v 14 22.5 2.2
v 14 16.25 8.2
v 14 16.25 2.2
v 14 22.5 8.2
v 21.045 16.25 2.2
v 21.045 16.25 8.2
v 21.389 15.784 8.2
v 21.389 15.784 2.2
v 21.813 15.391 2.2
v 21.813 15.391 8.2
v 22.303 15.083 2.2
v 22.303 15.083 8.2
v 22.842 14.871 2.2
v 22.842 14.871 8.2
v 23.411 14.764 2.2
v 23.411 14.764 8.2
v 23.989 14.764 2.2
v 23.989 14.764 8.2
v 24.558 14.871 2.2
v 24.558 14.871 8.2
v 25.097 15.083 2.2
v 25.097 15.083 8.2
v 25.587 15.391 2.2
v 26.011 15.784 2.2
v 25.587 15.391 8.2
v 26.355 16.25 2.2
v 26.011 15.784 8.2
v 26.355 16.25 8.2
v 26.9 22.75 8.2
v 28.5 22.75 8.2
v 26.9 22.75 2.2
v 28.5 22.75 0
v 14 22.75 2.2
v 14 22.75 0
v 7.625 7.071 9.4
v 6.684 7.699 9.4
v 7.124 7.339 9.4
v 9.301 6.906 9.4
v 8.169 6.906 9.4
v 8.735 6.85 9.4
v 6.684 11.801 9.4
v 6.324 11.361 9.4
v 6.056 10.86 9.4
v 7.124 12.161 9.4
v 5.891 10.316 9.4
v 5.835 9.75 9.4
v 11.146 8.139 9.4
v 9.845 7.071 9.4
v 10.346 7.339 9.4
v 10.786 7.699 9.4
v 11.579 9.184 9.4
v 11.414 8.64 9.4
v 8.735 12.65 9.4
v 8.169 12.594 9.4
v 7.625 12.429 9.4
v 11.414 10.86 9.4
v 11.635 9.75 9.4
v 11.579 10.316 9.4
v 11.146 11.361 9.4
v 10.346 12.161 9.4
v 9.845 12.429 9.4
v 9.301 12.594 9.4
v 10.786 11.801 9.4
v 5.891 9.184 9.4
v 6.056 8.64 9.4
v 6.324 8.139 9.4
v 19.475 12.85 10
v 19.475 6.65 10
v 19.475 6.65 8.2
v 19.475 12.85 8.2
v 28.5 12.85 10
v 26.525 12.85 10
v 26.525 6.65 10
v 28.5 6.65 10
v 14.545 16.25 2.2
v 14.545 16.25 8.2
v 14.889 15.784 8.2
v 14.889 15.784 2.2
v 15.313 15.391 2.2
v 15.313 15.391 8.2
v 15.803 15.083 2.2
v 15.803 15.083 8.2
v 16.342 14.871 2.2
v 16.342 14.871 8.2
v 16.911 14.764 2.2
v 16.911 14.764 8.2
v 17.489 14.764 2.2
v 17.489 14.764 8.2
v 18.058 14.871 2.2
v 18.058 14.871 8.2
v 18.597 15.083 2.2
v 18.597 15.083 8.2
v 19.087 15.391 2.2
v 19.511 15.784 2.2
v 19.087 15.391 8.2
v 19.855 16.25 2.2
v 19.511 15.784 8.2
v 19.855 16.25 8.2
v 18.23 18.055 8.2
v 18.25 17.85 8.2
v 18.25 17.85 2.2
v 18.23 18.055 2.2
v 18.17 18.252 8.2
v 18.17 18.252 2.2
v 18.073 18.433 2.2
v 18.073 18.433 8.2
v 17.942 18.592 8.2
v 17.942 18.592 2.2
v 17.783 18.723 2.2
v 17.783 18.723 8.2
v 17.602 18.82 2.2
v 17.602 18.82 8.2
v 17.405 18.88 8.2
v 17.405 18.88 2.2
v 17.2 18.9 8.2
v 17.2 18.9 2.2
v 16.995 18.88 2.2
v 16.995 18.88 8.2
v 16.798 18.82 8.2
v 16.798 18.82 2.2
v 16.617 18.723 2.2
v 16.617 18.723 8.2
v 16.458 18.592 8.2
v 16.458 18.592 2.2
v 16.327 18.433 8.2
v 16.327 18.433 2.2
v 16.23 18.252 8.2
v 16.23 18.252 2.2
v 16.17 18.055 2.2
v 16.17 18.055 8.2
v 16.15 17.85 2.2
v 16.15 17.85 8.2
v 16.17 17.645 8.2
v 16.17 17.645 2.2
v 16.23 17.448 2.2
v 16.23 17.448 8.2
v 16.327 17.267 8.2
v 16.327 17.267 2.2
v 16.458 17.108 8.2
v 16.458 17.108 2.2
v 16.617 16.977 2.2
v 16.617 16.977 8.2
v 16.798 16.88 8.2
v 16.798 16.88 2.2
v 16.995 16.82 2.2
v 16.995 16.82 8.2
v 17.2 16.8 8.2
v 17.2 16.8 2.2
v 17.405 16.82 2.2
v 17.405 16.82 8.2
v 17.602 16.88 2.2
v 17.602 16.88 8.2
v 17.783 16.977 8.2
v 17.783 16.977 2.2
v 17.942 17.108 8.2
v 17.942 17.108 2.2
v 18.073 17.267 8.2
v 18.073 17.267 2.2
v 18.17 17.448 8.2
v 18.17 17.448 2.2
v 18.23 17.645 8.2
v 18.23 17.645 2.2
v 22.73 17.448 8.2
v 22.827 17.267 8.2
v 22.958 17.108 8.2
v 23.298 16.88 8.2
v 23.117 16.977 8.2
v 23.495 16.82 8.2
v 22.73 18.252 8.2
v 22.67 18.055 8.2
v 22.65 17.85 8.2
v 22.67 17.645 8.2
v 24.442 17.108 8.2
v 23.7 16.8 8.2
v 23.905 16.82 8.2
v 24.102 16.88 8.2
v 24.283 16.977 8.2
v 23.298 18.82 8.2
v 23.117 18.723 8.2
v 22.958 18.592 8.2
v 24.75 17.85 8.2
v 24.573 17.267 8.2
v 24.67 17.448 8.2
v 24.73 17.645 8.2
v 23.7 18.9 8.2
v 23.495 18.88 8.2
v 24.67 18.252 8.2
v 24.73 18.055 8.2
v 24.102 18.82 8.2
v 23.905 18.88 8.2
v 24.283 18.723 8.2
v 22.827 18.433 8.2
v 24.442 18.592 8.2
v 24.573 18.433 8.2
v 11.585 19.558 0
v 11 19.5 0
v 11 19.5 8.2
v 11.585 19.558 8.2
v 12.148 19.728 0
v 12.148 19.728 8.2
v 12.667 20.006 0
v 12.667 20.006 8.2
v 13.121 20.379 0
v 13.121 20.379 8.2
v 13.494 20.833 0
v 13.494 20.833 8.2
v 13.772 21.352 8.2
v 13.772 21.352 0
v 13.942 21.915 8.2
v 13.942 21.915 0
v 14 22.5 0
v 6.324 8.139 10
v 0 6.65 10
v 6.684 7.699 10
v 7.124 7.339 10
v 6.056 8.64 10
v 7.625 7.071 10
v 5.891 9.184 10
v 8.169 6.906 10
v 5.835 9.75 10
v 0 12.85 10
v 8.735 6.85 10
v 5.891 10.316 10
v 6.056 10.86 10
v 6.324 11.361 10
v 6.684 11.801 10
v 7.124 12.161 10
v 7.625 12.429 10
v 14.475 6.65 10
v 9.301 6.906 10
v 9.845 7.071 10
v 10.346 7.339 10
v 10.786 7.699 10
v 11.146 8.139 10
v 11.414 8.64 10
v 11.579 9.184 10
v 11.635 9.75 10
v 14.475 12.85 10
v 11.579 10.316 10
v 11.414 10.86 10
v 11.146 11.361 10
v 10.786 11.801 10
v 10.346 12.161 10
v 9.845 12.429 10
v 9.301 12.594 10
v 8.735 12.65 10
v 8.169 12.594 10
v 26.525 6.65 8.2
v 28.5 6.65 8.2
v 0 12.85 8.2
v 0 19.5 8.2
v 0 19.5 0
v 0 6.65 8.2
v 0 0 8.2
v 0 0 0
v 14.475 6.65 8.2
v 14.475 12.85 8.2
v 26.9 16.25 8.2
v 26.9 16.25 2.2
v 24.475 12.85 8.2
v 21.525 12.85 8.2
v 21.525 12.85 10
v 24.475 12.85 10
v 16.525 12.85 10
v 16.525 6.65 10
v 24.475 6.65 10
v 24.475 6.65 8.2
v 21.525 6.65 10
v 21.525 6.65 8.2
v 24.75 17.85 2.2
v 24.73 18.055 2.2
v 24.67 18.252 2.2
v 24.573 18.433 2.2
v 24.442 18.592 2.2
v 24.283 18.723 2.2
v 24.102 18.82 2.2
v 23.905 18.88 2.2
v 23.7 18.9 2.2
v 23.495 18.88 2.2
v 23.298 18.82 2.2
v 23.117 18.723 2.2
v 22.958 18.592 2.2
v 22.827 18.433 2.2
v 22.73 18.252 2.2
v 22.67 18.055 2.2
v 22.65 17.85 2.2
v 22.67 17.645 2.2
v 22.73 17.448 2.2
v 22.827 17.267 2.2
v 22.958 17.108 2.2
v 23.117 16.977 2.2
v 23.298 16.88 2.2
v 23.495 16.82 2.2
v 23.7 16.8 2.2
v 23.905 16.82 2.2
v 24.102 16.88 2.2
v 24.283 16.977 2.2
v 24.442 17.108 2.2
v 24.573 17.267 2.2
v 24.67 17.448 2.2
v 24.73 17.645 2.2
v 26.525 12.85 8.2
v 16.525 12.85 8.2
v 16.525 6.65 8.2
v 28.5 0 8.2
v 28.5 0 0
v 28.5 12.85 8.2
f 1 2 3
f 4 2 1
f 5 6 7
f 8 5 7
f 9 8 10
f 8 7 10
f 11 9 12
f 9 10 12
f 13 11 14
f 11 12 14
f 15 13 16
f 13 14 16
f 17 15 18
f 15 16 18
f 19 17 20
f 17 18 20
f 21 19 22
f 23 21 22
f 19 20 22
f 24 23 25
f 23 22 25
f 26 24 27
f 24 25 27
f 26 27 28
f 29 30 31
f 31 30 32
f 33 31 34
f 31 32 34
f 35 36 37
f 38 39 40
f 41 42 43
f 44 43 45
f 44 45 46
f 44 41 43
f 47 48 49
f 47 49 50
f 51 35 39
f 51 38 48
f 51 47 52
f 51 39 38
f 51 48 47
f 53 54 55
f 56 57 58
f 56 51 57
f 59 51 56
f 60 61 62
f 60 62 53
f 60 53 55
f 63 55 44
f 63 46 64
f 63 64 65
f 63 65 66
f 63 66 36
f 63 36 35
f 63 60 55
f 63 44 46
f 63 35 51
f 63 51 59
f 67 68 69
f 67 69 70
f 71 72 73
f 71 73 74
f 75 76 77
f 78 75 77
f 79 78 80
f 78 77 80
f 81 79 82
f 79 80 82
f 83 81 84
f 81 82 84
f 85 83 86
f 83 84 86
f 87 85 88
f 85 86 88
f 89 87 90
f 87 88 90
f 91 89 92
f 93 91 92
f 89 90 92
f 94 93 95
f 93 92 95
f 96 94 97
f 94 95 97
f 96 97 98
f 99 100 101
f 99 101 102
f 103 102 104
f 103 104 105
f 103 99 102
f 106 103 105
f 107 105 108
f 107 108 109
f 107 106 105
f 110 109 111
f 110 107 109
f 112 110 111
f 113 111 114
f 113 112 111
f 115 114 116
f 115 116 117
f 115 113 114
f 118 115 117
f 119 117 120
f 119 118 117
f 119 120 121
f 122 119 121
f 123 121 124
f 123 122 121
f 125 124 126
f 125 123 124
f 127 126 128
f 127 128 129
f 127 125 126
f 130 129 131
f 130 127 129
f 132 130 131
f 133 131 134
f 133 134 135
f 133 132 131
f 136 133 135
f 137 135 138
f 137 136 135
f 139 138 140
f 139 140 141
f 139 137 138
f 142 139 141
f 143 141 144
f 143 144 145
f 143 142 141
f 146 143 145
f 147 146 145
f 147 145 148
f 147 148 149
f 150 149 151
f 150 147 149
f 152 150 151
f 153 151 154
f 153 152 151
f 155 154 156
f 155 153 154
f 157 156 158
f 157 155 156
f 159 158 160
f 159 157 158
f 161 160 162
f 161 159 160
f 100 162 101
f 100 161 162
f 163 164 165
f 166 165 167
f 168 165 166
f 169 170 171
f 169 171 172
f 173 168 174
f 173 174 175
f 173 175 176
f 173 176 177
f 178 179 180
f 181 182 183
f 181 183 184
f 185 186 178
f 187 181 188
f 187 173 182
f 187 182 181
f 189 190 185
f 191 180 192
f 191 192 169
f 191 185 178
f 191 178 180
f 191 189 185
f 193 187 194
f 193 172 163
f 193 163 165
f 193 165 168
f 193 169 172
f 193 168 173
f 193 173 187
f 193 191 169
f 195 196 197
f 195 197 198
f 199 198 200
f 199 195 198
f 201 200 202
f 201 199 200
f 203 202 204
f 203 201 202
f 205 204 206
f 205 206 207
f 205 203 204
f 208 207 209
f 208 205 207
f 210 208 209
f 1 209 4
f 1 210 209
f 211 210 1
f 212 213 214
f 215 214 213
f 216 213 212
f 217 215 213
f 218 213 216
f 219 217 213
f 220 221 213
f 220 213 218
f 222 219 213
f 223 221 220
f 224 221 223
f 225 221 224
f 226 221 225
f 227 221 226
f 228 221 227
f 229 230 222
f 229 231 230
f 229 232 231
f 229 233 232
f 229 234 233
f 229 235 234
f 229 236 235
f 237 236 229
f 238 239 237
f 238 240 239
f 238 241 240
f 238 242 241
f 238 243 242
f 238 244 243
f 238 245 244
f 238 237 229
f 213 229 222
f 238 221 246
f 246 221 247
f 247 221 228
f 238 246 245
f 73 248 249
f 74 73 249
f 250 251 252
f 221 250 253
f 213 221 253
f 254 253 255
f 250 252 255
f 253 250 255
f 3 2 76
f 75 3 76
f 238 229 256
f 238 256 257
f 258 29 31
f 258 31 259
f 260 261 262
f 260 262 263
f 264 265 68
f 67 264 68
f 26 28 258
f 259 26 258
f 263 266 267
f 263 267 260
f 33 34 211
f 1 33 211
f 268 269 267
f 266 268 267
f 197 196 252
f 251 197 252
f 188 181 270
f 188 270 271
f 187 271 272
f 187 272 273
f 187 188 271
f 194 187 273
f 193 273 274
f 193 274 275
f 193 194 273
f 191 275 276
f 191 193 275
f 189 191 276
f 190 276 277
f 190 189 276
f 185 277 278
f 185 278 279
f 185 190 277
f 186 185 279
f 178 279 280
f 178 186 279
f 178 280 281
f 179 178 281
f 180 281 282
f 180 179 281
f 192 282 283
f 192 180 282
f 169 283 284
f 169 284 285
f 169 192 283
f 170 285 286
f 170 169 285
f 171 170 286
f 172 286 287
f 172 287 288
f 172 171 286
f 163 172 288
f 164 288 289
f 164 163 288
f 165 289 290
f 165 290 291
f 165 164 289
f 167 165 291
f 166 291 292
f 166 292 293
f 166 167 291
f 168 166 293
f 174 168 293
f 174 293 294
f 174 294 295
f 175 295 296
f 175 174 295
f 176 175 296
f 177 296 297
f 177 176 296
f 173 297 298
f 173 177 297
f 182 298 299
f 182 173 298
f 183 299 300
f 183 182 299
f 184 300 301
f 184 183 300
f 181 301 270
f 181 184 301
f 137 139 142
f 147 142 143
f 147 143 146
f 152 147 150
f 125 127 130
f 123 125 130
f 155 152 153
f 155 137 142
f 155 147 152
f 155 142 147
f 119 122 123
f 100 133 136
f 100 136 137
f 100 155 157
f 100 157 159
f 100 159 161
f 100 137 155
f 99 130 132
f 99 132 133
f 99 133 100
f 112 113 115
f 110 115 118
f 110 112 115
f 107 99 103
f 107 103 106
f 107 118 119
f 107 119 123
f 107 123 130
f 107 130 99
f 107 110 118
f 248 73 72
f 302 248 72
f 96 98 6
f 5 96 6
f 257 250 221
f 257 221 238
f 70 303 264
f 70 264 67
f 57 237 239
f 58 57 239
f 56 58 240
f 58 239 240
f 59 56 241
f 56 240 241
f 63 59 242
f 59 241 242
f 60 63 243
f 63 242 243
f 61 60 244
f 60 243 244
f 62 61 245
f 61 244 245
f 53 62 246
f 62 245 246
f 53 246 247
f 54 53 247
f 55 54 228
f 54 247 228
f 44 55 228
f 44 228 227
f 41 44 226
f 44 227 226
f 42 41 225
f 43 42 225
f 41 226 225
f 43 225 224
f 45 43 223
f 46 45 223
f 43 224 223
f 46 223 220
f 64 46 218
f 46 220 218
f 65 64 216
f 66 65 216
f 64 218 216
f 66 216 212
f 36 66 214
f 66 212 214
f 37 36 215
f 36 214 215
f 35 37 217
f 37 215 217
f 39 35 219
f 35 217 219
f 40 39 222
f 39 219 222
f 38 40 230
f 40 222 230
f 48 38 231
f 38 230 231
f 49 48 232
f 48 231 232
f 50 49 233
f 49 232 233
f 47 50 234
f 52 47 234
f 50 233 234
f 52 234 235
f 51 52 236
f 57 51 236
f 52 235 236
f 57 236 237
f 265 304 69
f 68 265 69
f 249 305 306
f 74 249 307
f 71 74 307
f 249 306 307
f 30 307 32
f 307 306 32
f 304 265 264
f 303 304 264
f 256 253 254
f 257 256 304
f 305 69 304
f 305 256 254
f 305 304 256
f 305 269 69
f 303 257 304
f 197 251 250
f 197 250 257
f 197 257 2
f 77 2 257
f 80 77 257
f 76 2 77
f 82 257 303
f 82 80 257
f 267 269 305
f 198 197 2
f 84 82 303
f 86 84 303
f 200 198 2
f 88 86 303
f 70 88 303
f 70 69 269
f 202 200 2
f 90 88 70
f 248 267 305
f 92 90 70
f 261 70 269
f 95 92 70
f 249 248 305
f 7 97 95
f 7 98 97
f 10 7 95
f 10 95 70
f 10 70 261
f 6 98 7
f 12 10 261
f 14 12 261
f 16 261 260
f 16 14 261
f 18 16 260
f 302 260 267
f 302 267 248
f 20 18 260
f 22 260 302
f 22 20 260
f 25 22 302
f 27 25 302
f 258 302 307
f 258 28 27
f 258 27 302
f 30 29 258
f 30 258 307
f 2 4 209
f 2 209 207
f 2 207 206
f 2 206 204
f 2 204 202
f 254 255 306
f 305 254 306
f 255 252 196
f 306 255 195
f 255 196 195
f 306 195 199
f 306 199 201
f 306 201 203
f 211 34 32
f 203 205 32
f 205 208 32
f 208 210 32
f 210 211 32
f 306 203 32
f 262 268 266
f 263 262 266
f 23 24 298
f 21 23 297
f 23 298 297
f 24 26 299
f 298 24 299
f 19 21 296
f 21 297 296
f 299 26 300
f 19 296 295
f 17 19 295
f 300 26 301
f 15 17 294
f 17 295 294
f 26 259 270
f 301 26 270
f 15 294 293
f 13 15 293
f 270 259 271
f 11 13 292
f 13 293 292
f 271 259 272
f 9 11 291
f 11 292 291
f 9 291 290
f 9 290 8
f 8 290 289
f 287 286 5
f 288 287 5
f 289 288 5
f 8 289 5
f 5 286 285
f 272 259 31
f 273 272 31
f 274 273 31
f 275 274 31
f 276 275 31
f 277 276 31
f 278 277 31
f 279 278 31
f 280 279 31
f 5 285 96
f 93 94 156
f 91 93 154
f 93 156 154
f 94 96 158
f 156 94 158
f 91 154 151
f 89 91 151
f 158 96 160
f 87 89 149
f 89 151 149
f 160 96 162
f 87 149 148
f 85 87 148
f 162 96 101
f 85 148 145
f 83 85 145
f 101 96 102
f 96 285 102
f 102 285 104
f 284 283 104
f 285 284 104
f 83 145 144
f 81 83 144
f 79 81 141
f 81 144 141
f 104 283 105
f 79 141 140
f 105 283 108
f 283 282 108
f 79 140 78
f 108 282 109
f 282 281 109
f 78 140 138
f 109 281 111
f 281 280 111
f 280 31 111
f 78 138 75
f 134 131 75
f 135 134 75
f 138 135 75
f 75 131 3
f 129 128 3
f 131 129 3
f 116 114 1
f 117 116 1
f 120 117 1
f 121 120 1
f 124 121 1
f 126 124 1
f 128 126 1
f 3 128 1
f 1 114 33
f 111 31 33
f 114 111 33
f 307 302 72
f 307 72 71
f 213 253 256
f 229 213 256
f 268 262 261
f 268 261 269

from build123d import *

# Parameters (mm, degrees)
PAD004_DEPTH    = 8.2
SKETCH014_W     = 28.5
SKETCH014_H     = 6.2
PAD005_DEPTH    = 1.8
SKETCH015_R     = 2.9
POCKET004_DEPTH = 0.6
SKETCH016_W     = 2.05
SKETCH016_H     = 6.2
POCKET005_DEPTH = 1.8
SKETCH018_R     = 1.05
POCKET007_DEPTH = 6


with BuildPart() as part:
    # Sketch013 → Pad004 (new body)
    with BuildSketch(Plane.XY):
        with BuildLine():
            Line((0, 0), (28.5, 0))
            Line((28.5, 0), (28.5, 22.75))
            Line((28.5, 22.75), (14, 22.75))
            Line((14, 22.75), (14, 22.5))
            ThreePointArc((11, 19.5), (13.12132, 20.37868), (14, 22.5))
            Line((11, 19.5), (0, 19.5))
            Line((0, 19.5), (0, 0))
        make_face()
    extrude(amount=PAD004_DEPTH)

    # Sketch014 (on Face9 of Pad004) → Pad005 (join)
    with BuildSketch(Plane.XY.offset(8.2)):
        with Locations((14.25, 9.75)):
            Rectangle(SKETCH014_W, SKETCH014_H)
    extrude(amount=PAD005_DEPTH)

    # Sketch015 (on Face11 of Pad005) → Pocket004 (cut)
    with BuildSketch(Plane.XY.offset(10)):
        with Locations((8.735056, 9.75)):
            Circle(SKETCH015_R)
    extrude(amount=-POCKET004_DEPTH, mode=Mode.SUBTRACT)

    # Sketch016 (on Face10 of Pocket004) → Pocket005 (cut)
    with BuildSketch(Plane.XY.offset(10)):
        with Locations((15.5, 9.75)):
            Rectangle(SKETCH016_W, SKETCH016_H)
        Polygon((21.525, 12.85), (21.525, 6.65), (19.475, 6.65), (19.475, 12.85), (20.5, 12.85), align=None)
        with Locations((25.5, 9.75)):
            Rectangle(SKETCH016_W, SKETCH016_H)
    extrude(amount=-POCKET005_DEPTH, mode=Mode.SUBTRACT)

    # Sketch018 (on Face19 of Clone001) → Pocket007 (cut)
    with BuildSketch(Plane.XY.offset(8.2)):
        with BuildLine():
            Line((14, 22.75), (26.9, 22.75))
            Line((26.9, 22.75), (26.9, 16.25))
            Line((26.355184, 16.25), (26.9, 16.25))
            ThreePointArc((21.044816, 16.25), (23.7, 14.75), (26.355184, 16.25))
            Line((20.45, 16.25), (21.044816, 16.25))
            Line((19.855184, 16.25), (20.45, 16.25))
            ThreePointArc((14.544816, 16.25), (17.2, 14.75), (19.855184, 16.25))
            Line((14, 16.25), (14.544816, 16.25))
            Line((14, 16.25), (14, 22.75))
        make_face()
        with Locations((17.2, 17.85)):
            Circle(SKETCH018_R, mode=Mode.SUBTRACT)
        with Locations((23.7, 17.85)):
            Circle(SKETCH018_R, mode=Mode.SUBTRACT)
    extrude(amount=-POCKET007_DEPTH, mode=Mode.SUBTRACT)


solid = part.part
